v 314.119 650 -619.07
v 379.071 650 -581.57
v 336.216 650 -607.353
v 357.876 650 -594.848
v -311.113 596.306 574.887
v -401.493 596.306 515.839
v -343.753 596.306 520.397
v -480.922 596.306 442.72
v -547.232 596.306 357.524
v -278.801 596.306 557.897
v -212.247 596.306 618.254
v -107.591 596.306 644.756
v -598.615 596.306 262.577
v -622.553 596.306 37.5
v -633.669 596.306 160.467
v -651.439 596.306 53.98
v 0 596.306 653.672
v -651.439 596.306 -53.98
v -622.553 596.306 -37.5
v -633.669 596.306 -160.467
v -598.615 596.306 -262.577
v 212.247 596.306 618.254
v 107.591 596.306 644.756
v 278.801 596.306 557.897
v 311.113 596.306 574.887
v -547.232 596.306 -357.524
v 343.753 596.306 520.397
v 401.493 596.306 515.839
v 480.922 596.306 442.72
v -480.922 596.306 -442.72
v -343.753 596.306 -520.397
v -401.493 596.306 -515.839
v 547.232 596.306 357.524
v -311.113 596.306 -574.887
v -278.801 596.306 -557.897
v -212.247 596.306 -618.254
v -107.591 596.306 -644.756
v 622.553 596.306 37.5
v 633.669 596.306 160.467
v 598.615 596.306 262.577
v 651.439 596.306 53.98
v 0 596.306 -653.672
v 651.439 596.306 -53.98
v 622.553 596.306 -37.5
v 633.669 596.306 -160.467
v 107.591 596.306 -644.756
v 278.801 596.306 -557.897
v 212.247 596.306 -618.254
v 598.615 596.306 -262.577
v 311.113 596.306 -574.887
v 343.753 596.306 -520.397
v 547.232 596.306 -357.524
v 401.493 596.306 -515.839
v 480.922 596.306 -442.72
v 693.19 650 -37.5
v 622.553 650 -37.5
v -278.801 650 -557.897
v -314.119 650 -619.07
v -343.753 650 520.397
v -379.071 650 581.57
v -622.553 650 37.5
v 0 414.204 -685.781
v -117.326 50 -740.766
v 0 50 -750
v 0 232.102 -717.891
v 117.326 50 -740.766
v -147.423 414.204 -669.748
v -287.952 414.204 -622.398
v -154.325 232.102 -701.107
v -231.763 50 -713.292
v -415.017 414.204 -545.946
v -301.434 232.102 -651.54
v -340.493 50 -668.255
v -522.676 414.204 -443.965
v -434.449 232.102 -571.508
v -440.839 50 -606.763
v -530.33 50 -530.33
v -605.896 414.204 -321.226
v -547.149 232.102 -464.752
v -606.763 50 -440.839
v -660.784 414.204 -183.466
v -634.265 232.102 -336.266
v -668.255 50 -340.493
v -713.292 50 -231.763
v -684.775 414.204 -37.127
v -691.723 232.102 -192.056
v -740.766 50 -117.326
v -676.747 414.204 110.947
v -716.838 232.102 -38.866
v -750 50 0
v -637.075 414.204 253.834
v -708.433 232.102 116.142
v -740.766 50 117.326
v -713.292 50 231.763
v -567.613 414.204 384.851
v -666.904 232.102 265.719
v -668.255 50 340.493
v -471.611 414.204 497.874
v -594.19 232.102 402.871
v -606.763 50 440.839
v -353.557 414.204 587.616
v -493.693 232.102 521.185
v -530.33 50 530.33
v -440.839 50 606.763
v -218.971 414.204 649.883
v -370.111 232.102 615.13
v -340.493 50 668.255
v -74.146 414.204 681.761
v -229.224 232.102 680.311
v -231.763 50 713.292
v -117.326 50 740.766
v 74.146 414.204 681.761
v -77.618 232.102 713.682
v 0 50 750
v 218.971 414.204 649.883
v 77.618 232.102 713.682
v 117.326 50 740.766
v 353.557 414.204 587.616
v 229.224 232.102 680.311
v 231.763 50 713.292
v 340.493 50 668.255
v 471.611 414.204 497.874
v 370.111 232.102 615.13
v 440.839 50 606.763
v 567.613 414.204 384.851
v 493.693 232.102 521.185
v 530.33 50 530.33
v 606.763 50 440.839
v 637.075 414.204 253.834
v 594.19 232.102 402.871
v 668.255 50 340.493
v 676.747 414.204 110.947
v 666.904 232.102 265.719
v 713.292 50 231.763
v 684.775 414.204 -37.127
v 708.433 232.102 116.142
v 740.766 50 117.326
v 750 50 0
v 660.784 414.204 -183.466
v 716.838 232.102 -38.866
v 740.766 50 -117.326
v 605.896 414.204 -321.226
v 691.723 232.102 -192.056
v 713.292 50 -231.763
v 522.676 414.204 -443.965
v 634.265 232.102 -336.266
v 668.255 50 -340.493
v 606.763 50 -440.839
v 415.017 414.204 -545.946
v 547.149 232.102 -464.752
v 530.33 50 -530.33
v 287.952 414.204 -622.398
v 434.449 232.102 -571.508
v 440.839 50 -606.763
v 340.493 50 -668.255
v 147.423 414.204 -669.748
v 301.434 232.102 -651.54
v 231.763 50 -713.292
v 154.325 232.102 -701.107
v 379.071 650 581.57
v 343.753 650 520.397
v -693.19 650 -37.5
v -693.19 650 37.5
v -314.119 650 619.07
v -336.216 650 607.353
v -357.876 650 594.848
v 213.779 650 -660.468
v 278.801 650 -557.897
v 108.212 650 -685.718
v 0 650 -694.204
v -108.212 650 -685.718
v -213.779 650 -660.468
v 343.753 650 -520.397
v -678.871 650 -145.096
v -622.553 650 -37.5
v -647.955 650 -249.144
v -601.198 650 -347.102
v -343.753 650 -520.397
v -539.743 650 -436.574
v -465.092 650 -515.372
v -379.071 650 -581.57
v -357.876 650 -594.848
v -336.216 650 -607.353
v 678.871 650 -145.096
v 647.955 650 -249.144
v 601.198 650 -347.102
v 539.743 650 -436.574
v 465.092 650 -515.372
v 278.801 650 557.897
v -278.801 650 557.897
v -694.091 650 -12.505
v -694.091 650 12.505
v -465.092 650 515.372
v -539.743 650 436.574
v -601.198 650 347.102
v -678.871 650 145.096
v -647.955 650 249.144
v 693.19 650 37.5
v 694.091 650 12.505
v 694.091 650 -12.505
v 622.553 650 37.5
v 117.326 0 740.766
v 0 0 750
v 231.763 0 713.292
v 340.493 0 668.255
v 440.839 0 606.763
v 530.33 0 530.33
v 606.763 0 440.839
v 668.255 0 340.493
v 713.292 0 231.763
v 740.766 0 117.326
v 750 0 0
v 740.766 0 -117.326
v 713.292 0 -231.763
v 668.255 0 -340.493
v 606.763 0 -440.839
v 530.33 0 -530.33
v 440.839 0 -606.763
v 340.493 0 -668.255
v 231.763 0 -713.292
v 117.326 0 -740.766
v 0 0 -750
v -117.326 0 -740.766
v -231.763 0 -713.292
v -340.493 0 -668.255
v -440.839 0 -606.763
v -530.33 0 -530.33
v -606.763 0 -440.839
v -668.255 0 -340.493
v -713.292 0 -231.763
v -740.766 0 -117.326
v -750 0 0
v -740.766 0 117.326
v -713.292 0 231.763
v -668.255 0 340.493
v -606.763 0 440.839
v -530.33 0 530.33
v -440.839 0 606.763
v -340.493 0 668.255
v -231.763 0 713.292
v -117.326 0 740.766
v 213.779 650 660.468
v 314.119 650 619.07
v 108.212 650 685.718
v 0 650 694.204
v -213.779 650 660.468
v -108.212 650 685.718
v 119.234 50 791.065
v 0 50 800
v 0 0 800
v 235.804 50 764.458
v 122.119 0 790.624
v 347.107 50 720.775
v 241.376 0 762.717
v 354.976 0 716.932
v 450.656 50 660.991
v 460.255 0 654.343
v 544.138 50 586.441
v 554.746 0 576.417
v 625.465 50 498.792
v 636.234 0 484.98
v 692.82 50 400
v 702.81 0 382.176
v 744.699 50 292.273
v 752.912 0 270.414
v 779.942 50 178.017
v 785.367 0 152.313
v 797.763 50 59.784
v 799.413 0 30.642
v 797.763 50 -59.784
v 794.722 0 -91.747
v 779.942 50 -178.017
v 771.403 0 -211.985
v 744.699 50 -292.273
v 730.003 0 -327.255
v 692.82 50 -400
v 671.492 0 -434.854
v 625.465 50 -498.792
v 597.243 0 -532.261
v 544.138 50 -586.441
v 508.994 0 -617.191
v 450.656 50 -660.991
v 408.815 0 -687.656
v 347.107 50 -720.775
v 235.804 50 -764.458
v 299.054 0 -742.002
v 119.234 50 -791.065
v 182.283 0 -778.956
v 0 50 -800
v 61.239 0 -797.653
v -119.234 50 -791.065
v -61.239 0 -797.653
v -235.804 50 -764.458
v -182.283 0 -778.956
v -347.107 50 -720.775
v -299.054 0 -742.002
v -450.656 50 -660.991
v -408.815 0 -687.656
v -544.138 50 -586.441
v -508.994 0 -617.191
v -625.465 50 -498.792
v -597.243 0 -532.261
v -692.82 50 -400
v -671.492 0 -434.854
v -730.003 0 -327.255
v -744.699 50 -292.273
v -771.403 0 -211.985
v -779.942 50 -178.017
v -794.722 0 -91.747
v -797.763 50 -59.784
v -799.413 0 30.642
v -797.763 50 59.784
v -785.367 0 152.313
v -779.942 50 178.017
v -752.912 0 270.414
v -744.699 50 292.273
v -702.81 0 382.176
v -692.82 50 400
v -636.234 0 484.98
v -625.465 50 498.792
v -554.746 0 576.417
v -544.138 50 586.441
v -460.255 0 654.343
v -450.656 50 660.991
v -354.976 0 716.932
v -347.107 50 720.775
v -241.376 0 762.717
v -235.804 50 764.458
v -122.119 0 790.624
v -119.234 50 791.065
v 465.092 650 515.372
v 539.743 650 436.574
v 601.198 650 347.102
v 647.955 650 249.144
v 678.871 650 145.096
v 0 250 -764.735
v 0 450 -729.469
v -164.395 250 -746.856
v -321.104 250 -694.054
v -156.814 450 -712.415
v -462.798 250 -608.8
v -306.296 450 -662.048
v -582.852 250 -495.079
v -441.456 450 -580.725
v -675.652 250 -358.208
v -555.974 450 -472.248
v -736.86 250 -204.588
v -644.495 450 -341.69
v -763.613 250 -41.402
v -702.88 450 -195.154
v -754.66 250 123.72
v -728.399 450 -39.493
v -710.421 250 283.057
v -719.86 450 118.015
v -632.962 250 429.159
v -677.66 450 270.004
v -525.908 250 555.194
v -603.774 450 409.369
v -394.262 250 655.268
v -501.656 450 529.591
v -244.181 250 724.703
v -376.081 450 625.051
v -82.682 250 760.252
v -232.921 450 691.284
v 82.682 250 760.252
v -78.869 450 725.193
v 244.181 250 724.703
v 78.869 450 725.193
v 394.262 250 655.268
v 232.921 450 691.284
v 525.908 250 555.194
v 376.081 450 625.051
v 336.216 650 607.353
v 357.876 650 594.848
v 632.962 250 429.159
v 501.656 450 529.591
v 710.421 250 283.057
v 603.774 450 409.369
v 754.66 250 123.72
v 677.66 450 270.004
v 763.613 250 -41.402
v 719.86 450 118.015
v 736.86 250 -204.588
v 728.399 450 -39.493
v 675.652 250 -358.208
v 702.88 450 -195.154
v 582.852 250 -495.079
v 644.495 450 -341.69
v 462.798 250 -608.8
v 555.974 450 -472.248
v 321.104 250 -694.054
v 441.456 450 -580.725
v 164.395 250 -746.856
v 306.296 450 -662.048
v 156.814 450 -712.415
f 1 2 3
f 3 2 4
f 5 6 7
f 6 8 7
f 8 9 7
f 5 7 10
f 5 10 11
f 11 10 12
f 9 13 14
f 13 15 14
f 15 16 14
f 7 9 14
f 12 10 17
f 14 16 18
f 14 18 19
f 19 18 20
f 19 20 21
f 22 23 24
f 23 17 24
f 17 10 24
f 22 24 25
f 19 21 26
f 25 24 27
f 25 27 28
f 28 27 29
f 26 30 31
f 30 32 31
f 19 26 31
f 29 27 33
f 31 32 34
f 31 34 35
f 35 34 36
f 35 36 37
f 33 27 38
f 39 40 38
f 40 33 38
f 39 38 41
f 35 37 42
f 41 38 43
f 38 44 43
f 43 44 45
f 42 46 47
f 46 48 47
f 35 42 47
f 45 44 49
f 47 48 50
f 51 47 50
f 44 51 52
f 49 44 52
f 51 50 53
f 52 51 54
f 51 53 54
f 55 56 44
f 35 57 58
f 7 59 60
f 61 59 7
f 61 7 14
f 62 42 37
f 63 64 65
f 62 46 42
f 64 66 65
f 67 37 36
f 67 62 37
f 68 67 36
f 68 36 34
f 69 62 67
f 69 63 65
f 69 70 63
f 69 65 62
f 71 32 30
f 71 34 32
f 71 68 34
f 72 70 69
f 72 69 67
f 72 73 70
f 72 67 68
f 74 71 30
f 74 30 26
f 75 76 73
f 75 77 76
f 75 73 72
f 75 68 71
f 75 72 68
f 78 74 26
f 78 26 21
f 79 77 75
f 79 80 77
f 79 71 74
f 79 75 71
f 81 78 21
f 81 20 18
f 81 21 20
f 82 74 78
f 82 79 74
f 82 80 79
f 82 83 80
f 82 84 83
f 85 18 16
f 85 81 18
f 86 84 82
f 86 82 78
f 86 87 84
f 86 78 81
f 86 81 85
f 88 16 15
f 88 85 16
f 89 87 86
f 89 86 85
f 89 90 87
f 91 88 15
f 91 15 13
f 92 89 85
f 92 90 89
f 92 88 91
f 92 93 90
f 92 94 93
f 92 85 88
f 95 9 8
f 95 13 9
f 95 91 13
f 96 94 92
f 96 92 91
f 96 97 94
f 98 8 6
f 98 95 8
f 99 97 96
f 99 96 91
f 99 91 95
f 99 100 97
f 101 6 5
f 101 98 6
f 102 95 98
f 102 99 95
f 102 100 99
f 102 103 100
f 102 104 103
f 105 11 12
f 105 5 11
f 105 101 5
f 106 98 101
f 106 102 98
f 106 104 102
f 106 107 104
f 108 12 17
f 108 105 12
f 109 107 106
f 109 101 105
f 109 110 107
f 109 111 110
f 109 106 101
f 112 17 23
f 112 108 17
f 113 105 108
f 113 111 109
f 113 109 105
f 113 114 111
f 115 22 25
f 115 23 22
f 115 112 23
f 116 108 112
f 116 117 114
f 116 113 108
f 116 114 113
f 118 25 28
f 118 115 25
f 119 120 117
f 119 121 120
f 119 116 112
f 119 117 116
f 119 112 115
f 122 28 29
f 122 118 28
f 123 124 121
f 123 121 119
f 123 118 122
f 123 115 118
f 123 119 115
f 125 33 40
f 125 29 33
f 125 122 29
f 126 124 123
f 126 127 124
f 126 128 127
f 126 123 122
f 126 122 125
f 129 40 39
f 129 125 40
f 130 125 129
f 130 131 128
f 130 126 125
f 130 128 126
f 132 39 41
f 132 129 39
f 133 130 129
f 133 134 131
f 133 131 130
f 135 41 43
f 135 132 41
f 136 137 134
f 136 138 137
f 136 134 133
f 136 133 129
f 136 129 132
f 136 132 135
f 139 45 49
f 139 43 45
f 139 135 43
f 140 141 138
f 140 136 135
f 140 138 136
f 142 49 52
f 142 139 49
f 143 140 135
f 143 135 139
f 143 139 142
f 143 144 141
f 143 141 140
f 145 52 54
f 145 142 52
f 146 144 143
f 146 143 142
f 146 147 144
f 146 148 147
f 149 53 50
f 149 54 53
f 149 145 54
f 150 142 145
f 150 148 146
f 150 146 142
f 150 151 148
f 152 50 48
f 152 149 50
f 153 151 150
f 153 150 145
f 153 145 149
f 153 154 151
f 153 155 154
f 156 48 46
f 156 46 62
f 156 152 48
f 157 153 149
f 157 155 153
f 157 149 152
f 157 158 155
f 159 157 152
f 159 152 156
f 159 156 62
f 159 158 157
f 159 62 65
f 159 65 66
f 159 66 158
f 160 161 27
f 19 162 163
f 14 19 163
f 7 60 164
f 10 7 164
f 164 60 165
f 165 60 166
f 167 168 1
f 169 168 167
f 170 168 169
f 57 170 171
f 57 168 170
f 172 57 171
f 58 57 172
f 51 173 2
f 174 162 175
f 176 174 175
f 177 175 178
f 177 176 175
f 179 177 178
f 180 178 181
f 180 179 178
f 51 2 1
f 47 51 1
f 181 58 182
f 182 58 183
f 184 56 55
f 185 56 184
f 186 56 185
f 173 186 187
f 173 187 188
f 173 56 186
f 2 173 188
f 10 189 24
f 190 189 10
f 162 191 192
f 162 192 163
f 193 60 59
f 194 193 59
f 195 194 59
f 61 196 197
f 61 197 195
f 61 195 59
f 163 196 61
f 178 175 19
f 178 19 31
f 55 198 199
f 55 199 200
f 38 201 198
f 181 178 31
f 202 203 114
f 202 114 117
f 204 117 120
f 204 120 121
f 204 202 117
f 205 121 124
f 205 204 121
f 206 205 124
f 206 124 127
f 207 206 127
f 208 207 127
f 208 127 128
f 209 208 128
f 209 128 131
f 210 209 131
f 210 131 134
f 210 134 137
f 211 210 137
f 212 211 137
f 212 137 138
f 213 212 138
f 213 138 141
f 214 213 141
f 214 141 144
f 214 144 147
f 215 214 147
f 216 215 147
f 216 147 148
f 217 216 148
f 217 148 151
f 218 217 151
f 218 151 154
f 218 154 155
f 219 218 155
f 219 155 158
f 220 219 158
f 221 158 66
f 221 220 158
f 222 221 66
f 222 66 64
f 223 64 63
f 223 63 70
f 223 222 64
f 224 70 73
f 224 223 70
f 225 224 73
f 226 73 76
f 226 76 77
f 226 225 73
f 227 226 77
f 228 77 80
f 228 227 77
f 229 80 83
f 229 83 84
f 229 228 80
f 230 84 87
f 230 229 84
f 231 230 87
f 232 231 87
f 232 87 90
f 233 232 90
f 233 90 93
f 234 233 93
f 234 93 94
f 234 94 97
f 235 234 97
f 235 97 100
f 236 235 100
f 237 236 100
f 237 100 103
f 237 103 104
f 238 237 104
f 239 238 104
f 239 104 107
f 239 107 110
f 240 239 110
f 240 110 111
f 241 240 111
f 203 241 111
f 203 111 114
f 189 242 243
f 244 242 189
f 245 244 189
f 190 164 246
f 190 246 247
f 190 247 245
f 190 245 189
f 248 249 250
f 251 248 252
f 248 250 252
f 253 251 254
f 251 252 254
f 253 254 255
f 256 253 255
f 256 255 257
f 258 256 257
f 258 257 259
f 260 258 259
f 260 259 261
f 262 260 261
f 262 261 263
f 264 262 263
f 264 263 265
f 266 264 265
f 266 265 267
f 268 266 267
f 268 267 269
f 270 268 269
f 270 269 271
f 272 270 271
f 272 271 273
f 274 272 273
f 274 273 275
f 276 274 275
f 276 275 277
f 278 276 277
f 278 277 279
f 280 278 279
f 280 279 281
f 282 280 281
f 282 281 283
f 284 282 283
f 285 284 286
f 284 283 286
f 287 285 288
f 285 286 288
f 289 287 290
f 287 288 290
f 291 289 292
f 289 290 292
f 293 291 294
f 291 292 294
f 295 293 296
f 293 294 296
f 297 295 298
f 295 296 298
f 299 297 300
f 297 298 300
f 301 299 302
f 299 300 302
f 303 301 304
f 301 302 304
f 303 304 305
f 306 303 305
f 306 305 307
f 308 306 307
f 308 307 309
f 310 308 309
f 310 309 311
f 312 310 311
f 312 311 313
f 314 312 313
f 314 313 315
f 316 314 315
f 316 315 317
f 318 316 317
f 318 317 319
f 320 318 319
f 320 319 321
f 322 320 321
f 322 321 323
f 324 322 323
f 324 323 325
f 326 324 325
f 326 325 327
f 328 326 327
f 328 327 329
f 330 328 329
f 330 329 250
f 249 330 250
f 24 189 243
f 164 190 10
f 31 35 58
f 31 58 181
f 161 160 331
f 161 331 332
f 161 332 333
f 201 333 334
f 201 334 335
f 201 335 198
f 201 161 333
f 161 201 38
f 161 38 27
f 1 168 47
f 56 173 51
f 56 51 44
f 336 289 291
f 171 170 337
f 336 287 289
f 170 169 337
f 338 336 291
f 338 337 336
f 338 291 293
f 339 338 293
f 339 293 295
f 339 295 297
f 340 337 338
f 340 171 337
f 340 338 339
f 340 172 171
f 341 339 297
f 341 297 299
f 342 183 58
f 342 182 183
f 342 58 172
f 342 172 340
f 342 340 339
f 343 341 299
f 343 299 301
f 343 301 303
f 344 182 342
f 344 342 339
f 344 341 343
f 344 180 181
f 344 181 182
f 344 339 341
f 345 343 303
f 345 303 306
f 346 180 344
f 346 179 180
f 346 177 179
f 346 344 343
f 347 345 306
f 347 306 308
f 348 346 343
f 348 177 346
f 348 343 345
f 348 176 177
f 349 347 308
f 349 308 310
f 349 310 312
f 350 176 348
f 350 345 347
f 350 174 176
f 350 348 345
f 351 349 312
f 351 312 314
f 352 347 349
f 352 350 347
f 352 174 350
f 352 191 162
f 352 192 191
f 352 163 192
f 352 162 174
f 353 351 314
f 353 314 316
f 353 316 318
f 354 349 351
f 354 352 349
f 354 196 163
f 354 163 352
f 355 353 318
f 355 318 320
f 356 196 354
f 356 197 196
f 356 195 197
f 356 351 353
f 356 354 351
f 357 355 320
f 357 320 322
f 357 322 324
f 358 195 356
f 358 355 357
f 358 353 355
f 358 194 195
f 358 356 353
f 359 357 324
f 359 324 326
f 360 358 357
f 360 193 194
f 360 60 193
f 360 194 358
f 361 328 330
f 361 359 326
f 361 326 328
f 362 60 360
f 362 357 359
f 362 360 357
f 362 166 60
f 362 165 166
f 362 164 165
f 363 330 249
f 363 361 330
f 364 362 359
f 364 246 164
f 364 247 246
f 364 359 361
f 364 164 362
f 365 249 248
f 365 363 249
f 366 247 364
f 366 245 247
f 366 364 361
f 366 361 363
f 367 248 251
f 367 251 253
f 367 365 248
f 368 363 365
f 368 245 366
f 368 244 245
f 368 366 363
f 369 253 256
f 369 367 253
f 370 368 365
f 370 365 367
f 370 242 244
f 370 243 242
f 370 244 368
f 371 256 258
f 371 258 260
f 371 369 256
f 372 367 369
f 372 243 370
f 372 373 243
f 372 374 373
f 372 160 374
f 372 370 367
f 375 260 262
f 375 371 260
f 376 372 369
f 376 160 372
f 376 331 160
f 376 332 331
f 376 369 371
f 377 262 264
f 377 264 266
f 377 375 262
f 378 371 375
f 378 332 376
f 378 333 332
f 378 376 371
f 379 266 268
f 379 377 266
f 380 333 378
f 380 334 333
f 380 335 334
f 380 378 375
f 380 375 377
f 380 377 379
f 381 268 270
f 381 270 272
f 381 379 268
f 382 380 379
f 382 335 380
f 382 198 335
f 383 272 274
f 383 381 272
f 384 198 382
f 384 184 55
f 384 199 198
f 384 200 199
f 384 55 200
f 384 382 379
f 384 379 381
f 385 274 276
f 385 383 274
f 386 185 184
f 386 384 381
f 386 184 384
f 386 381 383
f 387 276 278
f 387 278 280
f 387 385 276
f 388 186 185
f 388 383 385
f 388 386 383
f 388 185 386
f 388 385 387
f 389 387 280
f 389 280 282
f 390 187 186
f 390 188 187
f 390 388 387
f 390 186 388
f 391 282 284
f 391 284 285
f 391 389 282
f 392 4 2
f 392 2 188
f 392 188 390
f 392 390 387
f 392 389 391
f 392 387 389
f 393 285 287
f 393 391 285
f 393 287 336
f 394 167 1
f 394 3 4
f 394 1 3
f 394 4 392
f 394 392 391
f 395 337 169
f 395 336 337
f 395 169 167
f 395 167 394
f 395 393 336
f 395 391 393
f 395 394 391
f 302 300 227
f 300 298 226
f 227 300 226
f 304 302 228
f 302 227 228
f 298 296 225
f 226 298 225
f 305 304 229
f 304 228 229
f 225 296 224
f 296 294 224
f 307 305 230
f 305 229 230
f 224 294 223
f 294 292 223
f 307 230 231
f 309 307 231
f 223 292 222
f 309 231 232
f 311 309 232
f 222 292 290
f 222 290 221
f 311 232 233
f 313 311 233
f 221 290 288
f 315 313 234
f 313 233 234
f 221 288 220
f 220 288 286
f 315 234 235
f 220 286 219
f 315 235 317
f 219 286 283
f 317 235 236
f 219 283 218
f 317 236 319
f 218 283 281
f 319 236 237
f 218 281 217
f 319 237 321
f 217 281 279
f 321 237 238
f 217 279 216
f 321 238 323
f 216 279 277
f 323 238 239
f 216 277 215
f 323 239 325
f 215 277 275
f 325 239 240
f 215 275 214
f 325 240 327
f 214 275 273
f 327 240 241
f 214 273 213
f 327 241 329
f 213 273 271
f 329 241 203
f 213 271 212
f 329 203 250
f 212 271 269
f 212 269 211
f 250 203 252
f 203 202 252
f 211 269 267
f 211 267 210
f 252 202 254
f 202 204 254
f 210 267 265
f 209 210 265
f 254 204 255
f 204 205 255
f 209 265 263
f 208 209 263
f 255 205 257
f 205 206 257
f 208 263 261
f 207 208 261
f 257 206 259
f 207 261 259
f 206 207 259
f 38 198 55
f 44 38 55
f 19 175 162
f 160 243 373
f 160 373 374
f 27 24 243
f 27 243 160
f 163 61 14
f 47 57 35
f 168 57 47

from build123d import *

# Parameters (mm, degrees)
SKETCH1_R           = 800
SKETCH1_R_2         = 750
BOSS_EXTRUDE1_DEPTH = 50
SKETCH15_R          = 694.203811575
BOSS_EXTRUDE2_DEPTH = 53.694202
SKETCH18_W          = 70.63704417
SKETCH18_H          = 75
CUT_EXTRUDE4_DEPTH  = 130
CIRPATTERN1_COUNT   = 6


with BuildPart() as part:
    # Sketch1 → Boss-Extrude1 (new body)
    with BuildSketch(Plane(origin=(0, 0, 0), x_dir=(1, 0, 0), z_dir=(0, 1, 0))):
        with Locations(Location((0, 0, 0), (0, 0, 270))):
            Circle(SKETCH1_R)
        with Locations(Location((0, 0, 0), (0, 0, 270))):
            Circle(SKETCH1_R_2, mode=Mode.SUBTRACT)
    extrude(amount=BOSS_EXTRUDE1_DEPTH)

    # Sketch14 → Revolve1 (revolve)
    with BuildSketch(Plane(origin=(0, 0, 0), x_dir=(0, 0, -1), z_dir=(1, 0, 0)), mode=Mode.PRIVATE) as revolve1_sk:
        Polygon((-644.203811575, 650), (-750, 50), (-800, 50), (-694.203811575, 650), align=None)
    revolve(revolve1_sk.sketch.rotate(Axis((0, 0, 0), (0, 1, 0)), 180), axis=Axis((0, 0, 0), (0, 1, 0)))

    # Sketch15 → Boss-Extrude2 (add)
    with BuildSketch(Plane(origin=(0, 650, 0), x_dir=(1, 0, 0), z_dir=(0, 1, 0))):
        Circle(SKETCH15_R)
        Polygon((278.800635598, 557.896866039), (343.752540882, 520.396866039), (622.55317648, 37.5), (622.55317648, -37.5), (343.752540882, -520.396866039), (278.800635598, -557.896866039), (-278.800635598, -557.896866039), (-343.752540882, -520.396866039), (-622.55317648, -37.5), (-622.55317648, 37.5), (-343.752540882, 520.396866039), (-278.800635598, 557.896866039), align=None, mode=Mode.SUBTRACT)
    extrude(amount=-BOSS_EXTRUDE2_DEPTH)

    # Sketch18 → Cut-Extrude4 (cut, along a direction that is not the sketch's normal)
    with BuildSketch(Plane(origin=(0, 650, 0), x_dir=(1, 0, 0), z_dir=(0, 1, 0))):
        with Locations((657.871698565, 0)):
            Rectangle(SKETCH18_W, SKETCH18_H)
    cut_extrude4 = extrude(amount=-CUT_EXTRUDE4_DEPTH, dir=(0.7961076341406244, 0.6051550502664734, 0), mode=Mode.SUBTRACT)

    # CirPattern1: Cut-Extrude4 ×6 about axis
    cirpattern1_axis = Axis((0, 0, 0), (0, 1, 0))
    for i in range(1, CIRPATTERN1_COUNT):
        add(cut_extrude4.rotate(cirpattern1_axis, i * 360 / CIRPATTERN1_COUNT), mode=Mode.SUBTRACT)


solid = part.part
